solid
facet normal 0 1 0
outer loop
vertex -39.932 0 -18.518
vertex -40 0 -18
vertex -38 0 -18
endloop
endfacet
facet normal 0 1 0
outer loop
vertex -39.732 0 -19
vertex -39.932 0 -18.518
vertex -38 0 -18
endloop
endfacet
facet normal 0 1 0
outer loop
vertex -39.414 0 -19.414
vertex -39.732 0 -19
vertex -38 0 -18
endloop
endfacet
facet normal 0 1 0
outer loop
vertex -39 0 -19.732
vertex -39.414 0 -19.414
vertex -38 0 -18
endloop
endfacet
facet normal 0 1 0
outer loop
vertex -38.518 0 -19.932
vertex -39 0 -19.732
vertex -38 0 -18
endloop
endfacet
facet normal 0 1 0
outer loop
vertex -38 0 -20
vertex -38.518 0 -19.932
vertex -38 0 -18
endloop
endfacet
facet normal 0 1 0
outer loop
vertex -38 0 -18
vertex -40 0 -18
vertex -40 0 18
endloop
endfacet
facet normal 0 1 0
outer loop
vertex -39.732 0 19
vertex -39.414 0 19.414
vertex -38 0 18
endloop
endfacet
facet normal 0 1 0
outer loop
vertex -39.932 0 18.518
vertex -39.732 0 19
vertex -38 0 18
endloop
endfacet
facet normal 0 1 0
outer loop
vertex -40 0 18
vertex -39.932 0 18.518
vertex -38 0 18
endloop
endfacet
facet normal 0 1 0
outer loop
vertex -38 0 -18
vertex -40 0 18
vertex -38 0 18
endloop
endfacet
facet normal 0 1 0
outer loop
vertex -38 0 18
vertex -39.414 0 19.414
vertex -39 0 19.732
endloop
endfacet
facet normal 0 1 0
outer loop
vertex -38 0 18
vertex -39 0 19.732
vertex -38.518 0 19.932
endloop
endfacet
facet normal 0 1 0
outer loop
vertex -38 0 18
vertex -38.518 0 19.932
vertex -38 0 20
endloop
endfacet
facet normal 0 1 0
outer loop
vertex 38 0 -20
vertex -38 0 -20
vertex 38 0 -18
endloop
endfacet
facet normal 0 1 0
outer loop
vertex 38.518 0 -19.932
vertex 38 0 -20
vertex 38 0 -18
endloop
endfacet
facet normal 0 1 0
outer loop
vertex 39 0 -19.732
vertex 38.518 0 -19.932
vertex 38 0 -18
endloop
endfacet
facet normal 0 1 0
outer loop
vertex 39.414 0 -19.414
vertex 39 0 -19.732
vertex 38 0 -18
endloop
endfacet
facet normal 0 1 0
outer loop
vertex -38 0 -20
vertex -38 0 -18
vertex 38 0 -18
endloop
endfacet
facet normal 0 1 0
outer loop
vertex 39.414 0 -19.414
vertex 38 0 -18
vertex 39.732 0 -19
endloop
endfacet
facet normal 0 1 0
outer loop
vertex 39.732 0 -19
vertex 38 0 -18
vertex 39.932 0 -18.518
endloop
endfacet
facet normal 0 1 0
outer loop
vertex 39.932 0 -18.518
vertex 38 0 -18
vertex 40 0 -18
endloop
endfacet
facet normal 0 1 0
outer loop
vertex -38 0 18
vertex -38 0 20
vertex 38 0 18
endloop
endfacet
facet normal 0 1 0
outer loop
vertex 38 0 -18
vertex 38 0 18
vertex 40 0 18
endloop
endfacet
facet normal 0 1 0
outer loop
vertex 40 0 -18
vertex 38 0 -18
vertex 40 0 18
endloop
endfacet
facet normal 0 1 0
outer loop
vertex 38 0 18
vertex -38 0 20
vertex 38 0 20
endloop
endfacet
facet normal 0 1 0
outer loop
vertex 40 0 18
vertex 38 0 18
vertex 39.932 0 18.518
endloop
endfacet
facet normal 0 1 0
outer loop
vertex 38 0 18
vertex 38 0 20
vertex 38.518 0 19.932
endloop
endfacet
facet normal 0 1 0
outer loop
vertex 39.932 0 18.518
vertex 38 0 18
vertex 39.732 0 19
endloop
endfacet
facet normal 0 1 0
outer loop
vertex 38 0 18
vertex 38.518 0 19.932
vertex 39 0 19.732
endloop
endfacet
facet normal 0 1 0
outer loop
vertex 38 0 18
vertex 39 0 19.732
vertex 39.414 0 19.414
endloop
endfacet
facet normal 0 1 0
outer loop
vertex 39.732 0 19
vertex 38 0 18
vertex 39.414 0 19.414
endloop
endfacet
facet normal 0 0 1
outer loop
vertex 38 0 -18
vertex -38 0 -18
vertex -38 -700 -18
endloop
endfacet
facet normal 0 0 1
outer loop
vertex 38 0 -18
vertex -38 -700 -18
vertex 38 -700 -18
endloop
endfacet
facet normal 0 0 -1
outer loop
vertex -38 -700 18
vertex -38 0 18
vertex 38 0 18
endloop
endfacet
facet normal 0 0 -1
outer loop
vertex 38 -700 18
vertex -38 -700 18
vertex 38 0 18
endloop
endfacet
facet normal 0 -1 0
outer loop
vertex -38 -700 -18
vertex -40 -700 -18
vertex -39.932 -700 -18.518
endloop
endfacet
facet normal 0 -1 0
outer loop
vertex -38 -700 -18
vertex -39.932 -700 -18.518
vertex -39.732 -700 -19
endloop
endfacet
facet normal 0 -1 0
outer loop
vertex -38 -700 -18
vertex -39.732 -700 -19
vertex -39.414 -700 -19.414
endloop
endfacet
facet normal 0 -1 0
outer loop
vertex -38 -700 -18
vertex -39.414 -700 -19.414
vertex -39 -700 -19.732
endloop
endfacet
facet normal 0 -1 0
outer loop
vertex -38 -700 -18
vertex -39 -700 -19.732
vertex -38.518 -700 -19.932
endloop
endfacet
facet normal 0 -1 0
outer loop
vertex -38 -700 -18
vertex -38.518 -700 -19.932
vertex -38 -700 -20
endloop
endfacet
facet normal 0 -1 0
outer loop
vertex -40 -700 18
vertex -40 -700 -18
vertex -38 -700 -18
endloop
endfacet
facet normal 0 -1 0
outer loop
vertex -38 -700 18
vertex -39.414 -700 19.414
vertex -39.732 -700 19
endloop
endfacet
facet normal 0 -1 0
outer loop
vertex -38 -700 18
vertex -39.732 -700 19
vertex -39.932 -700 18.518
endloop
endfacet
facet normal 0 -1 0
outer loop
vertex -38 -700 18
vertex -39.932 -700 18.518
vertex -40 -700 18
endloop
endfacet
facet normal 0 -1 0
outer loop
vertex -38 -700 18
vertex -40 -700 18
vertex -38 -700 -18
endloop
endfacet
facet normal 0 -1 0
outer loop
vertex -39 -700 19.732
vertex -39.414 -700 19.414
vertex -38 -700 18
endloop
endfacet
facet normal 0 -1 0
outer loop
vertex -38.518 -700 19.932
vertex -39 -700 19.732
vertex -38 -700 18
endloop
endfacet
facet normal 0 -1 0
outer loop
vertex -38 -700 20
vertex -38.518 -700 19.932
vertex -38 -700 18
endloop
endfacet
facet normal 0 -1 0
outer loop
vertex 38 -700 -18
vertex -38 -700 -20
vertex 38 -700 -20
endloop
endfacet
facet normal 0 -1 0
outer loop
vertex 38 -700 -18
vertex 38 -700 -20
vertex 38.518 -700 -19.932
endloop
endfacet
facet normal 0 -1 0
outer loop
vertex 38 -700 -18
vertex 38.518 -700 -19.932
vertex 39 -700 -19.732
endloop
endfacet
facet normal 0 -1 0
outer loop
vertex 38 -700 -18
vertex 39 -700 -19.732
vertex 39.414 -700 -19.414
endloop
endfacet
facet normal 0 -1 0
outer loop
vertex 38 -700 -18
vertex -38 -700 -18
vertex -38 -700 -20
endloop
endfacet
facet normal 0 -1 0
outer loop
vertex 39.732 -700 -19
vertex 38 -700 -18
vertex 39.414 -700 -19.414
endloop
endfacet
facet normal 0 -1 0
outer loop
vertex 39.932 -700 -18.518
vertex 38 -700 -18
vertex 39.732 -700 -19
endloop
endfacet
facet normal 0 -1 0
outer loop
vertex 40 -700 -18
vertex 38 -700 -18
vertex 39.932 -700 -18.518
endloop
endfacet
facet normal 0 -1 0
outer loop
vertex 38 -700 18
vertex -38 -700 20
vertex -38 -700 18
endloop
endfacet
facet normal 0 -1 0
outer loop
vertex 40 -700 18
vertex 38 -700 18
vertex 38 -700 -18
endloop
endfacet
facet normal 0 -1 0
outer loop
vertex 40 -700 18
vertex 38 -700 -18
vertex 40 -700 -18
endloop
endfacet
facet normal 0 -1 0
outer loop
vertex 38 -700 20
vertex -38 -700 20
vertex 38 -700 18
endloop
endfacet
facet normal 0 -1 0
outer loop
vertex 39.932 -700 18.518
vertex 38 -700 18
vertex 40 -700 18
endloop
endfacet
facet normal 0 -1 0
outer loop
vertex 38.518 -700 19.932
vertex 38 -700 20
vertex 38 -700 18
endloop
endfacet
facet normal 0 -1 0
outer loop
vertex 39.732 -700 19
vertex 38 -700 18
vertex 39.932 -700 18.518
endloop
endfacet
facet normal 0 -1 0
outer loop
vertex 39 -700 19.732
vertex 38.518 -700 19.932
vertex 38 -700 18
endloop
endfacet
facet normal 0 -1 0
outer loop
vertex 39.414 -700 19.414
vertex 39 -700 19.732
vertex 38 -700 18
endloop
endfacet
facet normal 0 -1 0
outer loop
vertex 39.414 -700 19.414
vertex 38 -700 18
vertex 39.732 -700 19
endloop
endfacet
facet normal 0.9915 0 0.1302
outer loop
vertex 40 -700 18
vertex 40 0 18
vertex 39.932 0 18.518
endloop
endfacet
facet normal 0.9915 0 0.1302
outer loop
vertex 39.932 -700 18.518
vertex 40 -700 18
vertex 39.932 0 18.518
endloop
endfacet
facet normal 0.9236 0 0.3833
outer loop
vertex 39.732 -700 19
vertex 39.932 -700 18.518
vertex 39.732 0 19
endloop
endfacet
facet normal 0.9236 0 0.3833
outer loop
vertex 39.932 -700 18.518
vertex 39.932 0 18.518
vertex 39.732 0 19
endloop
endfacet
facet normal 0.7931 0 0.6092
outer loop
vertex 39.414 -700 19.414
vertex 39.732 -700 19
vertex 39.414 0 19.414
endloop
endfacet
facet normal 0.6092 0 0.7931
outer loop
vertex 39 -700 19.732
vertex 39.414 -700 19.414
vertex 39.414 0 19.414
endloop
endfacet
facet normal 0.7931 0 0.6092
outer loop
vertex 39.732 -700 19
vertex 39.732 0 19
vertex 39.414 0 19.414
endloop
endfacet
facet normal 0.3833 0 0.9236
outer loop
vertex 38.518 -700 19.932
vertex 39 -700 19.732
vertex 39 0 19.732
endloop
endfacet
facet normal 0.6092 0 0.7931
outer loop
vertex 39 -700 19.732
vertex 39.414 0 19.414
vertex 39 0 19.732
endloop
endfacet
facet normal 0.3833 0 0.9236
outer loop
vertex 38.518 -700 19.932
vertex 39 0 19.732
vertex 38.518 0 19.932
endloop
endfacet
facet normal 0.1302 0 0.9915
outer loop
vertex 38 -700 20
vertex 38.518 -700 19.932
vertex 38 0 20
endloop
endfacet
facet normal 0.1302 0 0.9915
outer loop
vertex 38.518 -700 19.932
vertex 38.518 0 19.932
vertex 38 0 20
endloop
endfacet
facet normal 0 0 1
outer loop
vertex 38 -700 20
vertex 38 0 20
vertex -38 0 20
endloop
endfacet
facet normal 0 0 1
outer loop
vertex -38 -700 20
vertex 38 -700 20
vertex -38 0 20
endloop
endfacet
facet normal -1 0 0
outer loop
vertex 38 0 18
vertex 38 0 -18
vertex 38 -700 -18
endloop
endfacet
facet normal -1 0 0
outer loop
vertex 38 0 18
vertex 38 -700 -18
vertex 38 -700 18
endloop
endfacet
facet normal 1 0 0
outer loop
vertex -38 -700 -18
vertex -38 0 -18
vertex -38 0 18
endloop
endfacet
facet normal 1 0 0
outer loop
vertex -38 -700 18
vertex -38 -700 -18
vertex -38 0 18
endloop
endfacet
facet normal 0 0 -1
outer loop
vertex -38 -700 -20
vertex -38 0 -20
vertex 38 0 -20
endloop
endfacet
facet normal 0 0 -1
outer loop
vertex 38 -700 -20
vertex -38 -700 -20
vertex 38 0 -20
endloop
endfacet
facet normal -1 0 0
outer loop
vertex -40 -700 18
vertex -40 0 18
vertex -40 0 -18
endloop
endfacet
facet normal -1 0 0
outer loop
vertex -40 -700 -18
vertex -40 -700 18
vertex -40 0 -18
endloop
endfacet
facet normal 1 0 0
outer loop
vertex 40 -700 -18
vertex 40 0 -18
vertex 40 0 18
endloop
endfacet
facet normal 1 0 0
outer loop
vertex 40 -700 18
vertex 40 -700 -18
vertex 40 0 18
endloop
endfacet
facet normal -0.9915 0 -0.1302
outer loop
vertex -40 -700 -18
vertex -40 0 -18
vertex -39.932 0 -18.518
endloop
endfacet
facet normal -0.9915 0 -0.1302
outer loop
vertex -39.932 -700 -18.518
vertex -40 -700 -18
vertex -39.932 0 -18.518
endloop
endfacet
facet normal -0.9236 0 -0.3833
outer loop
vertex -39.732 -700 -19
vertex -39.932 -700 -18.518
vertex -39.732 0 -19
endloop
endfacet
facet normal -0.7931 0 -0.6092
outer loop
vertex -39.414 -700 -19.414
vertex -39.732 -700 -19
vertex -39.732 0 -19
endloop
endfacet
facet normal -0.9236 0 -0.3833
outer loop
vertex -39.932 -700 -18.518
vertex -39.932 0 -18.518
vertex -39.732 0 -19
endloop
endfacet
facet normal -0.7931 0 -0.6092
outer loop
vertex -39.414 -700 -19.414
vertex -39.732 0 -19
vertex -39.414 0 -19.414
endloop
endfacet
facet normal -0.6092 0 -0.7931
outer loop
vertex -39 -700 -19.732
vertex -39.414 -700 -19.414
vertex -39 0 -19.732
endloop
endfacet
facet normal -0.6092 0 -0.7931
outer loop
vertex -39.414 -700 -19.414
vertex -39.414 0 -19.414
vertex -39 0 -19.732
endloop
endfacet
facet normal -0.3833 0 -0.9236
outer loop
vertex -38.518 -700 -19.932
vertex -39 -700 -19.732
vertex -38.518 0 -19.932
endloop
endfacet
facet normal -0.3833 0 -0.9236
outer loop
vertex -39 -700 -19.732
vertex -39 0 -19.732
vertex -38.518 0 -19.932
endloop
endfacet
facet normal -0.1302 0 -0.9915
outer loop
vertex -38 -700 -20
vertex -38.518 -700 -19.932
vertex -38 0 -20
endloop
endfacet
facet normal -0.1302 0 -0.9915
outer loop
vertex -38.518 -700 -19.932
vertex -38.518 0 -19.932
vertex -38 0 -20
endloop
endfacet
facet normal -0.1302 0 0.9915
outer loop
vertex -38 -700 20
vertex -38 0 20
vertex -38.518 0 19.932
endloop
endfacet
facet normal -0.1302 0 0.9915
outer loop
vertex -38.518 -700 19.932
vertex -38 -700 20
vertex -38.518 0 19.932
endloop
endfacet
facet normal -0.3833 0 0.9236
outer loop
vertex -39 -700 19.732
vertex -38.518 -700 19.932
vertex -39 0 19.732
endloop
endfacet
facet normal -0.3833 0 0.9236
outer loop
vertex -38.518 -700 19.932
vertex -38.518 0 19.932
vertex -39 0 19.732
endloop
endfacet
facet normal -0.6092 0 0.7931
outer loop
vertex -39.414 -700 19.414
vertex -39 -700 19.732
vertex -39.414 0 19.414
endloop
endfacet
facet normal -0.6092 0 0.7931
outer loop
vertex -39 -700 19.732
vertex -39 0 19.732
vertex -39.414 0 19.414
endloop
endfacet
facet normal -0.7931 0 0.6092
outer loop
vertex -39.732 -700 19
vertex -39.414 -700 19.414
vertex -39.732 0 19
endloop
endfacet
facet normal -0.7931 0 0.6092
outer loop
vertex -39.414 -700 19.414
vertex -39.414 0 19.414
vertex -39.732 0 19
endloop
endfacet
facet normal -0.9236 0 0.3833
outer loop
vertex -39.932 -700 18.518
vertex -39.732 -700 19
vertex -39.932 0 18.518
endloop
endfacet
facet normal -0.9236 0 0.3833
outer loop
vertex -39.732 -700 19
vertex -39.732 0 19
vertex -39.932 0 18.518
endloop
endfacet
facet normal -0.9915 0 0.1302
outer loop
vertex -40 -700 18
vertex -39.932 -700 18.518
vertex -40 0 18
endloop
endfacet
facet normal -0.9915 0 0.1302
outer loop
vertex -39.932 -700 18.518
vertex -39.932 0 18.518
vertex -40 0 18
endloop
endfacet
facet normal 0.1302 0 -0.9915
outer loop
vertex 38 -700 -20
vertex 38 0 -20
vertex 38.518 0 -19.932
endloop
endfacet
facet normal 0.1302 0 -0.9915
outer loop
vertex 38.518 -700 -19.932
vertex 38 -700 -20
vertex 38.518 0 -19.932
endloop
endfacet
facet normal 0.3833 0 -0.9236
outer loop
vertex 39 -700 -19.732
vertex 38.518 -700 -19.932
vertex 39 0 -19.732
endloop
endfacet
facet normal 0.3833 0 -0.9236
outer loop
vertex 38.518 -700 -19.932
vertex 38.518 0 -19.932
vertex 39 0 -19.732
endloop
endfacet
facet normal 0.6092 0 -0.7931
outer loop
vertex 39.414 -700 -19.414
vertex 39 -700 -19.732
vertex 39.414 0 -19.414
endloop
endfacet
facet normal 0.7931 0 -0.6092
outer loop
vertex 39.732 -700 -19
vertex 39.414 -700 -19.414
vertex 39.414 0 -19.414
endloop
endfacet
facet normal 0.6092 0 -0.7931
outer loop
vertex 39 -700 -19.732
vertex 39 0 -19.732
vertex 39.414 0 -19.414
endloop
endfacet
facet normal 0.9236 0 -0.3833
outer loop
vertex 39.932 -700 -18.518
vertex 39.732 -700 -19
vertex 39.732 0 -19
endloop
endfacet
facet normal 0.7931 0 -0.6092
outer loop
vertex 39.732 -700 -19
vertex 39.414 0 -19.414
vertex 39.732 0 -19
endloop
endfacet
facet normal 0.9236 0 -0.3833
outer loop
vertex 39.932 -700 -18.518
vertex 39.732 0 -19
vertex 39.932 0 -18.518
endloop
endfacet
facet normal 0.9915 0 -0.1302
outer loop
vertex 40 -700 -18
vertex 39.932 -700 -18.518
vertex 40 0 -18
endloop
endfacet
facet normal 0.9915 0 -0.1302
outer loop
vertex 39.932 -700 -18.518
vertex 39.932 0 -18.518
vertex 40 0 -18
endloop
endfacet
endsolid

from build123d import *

# Parameters (mm, degrees)
F0_W     = 76
F0_H     = 36
F1_DEPTH = 700


# Not quite as in the source:
# - ends of sketch curves that miss each other by under 0.0002 mm in the source are joined


with BuildPart() as f1:
    # F0 (on Front) → F1 (new body)
    with BuildSketch(Plane.XZ):
        with BuildLine():
            ThreePointArc((-37.999999, 20), (-39.4142135624, 19.4142135624), (-40, 17.999999))
            Line((-40, 17.999999), (-40, -18))
            ThreePointArc((-40, -18), (-39.4142128553, -19.4142142695), (-37.999999, -20))
            Line((-37.999999, -20), (38, -20))
            ThreePointArc((38, -20), (39.4142139159, -19.4142132088), (40, -18))
            Line((40, -18), (40, 18))
            ThreePointArc((40, 18), (39.4142139159, 19.4142132088), (38.000001, 20))
            Line((38.000001, 20), (-37.999999, 20))
        make_face()
        Rectangle(F0_W, F0_H, mode=Mode.SUBTRACT)
    extrude(amount=F1_DEPTH)


solid = f1.part
